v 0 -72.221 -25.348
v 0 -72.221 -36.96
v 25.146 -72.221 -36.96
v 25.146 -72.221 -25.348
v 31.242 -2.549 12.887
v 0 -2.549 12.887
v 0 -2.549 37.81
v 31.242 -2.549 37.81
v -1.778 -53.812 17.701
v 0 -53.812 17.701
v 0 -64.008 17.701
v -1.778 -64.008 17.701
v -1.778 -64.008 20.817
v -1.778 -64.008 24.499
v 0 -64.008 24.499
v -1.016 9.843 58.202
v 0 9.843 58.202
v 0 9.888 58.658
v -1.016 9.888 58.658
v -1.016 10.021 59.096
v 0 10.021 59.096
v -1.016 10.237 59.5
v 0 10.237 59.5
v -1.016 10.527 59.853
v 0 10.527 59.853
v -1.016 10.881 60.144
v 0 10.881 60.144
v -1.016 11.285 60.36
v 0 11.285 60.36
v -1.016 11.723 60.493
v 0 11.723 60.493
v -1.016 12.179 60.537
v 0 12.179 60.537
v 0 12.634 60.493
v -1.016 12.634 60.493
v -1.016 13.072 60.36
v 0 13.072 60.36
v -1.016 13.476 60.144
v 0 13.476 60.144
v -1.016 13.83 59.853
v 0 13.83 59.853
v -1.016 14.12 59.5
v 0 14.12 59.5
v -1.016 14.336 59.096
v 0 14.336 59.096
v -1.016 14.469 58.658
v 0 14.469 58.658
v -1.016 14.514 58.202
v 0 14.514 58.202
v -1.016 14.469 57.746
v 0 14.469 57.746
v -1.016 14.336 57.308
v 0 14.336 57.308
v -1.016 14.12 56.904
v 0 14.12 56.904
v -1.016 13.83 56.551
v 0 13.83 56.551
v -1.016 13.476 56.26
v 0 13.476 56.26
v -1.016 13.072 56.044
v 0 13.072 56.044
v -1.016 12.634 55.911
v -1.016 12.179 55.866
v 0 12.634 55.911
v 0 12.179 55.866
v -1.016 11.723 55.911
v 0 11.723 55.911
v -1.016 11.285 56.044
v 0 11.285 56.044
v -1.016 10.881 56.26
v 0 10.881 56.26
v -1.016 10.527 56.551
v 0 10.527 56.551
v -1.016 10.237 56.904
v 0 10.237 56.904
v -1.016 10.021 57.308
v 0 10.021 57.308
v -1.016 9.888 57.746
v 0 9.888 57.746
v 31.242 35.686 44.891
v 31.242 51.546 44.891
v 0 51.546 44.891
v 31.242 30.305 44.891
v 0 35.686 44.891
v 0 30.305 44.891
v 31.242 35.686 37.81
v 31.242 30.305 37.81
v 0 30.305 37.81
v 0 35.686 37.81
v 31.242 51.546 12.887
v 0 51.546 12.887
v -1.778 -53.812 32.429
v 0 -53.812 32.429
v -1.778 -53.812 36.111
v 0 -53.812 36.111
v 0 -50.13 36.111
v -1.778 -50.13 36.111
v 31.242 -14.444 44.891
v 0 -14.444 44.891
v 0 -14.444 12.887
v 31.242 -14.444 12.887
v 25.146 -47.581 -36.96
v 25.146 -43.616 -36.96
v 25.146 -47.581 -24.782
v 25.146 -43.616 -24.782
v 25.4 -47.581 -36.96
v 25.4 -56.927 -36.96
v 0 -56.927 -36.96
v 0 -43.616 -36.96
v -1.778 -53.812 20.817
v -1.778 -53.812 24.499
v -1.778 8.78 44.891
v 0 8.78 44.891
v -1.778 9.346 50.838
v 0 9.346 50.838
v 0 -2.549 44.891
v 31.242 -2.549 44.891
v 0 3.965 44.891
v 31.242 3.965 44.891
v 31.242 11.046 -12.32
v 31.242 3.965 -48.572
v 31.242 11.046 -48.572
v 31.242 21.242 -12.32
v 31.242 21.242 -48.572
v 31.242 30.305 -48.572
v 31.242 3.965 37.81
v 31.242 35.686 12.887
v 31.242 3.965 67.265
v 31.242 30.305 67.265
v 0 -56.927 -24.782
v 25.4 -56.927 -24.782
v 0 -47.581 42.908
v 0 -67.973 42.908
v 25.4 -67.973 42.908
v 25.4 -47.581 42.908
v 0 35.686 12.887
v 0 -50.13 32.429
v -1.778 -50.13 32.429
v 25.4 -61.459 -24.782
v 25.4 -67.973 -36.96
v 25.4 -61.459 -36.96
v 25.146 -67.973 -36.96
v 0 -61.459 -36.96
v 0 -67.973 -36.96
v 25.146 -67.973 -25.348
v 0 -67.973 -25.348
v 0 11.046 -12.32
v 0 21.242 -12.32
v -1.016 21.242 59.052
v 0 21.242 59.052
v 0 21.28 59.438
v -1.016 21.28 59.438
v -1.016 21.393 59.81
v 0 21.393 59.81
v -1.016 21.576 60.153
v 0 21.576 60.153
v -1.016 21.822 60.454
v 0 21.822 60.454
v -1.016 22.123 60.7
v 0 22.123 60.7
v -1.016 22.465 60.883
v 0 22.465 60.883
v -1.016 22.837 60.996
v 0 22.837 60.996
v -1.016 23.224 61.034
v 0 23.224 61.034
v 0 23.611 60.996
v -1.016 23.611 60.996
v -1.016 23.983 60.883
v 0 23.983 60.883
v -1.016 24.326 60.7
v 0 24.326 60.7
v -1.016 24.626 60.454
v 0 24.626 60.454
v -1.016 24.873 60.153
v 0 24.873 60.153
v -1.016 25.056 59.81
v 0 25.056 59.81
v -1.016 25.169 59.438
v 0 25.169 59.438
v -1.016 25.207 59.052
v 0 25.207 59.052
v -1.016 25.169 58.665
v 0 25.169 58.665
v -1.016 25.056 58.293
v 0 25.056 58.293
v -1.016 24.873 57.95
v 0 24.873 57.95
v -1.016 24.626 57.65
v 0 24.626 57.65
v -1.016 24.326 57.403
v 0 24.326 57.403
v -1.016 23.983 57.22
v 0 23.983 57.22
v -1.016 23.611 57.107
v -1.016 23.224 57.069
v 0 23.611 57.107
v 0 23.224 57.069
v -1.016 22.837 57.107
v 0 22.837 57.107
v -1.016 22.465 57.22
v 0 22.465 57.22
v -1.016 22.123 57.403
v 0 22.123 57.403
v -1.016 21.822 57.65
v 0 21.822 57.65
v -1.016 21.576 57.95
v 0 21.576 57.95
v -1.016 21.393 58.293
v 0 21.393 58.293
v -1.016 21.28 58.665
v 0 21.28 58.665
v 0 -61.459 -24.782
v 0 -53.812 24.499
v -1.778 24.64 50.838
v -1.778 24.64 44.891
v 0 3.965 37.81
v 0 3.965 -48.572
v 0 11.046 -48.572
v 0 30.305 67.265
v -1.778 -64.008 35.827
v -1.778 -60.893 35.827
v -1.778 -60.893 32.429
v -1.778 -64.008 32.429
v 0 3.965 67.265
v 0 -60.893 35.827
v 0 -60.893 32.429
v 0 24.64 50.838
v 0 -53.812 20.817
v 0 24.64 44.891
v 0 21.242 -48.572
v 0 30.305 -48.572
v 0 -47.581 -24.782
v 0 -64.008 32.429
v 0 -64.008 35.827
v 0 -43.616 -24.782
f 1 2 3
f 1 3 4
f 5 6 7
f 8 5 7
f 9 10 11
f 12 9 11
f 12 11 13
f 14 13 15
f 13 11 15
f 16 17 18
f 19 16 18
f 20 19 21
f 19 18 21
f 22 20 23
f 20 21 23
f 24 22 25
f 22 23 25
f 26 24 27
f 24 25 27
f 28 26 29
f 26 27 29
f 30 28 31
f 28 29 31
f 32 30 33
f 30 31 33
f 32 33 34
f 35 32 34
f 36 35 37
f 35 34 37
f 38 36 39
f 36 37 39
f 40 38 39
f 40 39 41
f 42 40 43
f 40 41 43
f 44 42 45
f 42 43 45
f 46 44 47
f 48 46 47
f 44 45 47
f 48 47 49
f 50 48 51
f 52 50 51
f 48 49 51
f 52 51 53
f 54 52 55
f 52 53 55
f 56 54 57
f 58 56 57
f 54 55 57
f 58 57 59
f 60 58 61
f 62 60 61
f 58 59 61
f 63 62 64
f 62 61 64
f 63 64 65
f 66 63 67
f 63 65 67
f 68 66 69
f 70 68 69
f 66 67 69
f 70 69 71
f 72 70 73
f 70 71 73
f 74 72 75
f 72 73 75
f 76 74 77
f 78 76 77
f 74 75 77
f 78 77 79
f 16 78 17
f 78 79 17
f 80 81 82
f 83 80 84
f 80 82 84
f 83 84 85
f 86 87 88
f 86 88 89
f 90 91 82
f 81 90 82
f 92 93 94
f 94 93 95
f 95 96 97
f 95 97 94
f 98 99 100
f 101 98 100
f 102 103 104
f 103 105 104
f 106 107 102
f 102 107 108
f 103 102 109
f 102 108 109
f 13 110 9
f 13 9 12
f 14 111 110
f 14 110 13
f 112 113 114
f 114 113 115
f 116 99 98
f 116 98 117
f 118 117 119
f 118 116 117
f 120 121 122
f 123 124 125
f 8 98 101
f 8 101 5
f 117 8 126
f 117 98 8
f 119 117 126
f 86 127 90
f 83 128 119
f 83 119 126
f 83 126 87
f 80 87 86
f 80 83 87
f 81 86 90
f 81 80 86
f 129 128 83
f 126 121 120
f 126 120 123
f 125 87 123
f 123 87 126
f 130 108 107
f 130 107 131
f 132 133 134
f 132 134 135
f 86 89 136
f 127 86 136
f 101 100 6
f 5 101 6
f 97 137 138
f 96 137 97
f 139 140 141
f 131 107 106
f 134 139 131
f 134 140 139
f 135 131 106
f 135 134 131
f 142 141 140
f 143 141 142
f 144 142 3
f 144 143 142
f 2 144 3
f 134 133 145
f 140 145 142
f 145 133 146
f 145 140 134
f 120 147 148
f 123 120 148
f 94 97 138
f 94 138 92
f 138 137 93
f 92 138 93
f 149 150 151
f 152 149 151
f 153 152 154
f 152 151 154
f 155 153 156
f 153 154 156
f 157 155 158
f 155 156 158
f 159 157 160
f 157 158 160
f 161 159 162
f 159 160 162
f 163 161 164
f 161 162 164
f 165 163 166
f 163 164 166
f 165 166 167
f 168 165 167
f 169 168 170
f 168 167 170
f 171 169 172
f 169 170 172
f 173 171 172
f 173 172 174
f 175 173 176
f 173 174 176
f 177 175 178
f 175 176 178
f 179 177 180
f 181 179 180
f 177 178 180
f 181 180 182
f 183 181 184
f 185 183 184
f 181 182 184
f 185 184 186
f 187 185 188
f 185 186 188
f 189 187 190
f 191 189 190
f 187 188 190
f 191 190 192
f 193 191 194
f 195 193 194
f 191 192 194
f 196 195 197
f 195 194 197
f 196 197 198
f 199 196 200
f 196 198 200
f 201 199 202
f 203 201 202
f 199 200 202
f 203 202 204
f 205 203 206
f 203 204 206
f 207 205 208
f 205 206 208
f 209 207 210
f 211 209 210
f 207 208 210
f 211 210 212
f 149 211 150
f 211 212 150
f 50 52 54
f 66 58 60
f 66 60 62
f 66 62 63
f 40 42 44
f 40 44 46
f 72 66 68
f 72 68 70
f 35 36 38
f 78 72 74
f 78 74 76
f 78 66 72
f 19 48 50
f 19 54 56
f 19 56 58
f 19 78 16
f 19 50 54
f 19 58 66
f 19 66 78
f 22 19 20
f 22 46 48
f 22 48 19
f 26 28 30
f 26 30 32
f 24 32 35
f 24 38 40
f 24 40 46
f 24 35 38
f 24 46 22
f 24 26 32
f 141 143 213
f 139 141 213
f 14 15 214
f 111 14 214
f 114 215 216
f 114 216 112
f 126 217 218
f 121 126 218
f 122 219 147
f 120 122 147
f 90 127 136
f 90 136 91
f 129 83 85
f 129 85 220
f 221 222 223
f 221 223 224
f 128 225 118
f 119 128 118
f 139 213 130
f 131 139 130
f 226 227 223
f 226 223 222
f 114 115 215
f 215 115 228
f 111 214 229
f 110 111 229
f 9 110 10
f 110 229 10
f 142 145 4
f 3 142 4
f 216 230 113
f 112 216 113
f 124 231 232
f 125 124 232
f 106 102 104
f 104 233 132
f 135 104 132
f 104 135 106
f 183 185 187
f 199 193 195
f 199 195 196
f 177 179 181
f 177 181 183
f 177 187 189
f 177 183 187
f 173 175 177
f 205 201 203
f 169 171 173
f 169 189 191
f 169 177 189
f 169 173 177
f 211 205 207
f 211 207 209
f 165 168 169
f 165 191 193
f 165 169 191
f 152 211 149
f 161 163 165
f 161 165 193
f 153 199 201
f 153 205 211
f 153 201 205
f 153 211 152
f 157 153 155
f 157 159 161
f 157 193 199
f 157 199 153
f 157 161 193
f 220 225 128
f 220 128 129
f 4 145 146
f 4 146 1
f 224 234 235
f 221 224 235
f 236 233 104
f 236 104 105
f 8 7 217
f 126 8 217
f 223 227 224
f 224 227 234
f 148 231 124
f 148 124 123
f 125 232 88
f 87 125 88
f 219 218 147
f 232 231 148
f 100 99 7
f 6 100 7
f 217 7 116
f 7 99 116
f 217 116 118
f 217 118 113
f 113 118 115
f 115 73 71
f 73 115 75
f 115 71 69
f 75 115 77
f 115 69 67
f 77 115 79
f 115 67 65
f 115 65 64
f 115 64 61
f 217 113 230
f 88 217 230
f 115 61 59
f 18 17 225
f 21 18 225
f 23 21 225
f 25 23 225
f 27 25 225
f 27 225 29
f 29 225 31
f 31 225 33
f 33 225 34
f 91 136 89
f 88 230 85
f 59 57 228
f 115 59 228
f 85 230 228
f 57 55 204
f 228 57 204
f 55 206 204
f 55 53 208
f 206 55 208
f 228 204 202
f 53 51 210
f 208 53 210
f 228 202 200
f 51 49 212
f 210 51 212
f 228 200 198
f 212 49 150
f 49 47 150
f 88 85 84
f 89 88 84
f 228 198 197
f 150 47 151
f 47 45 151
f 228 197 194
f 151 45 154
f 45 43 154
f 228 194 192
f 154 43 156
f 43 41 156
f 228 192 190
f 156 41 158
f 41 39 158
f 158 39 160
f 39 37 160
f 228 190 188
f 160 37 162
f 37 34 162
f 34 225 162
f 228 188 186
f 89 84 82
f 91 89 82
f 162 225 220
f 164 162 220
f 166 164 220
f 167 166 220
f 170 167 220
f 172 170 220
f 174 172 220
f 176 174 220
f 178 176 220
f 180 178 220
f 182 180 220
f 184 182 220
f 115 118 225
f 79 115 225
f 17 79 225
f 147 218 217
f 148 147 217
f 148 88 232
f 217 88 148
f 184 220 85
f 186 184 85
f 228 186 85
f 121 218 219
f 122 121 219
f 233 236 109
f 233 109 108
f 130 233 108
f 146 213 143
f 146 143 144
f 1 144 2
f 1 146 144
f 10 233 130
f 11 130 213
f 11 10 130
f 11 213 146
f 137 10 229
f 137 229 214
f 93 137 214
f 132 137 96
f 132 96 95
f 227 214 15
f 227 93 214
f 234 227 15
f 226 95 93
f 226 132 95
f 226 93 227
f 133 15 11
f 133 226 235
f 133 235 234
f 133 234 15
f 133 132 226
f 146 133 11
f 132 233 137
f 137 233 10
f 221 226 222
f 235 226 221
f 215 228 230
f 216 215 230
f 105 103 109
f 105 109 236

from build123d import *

# Parameters (mm, degrees)
F0_W      = 26.339576114
F0_H      = 22.3744772375
F0_W_2    = 5.3812060505
F0_H_2    = 7.0805288851
F0_W_3    = 6.5140875522
F0_W_4    = 9.0630780905
F0_H_3    = 36.2523160875
F0_W_5    = 7.0805349387
F1_DEPTH  = 31.242
F3_DEPTH  = 1.778
F2_R      = 1.9825492054
F2_R_2    = 2.3355022463
F4_DEPTH  = 1.016
F5_W      = 20.3919298947
F5_H      = 20.9583751857
F5_W_2    = 6.5140910447
F5_H_2    = 9.9127404392
F5_W_3    = 9.3463025987
F5_H_3    = 12.1785104275
F5_H_4    = 2.2657699883
F6_DEPTH  = 25.4
F7_W      = 4.2483210564
F7_H      = 11.6120707244
F7_W_2    = 9.3463025987
F7_H_2    = 12.1785104275
F7_W_3    = 3.9651021361
F8_DEPTH  = 25.146
F9_W      = 3.6818757653
F9_H      = 3.6818794906
F9_W_2    = 3.1154304743
F9_H_2    = 3.3986568451
F9_H_3    = 3.1154323369
F9_W_3    = 5.0979815423
F9_W_4    = 1.9825510681
F10_DEPTH = 1.778


with BuildPart() as f1:
    # F0 (on Right) → F1 (new body)
    with BuildSketch(Plane.YZ):
        with Locations((17.1348841395, 56.0778025538)):
            Rectangle(F0_W, F0_H)
        Polygon((30.3046721965, 37.8100350499), (30.3046721965, 44.890563935), (3.9650960825, 44.890563935), (3.9650960825, 37.8100350499), (3.9650960825, -12.3201236129), (11.0456310213, -12.3201236129), (21.241594106, -12.3201236129), (30.3046721965, -12.3201236129), align=None)
        with Locations((32.9952752218, 41.3502994925)):
            Rectangle(F0_W_2, F0_H_2)
        with Locations((0.7080523064, 41.3502994925)):
            Rectangle(F0_W_3, F0_H_2)
        Polygon((51.5462644398, 44.890563935), (35.685878247, 44.890563935), (35.685878247, 37.8100350499), (35.685878247, 12.88656611), (51.5462644398, 12.88656611), align=None)
        Polygon((-2.5489914697, 37.8100350499), (-2.5489914697, 44.890563935), (-14.4442832097, 44.890563935), (-14.4442832097, 12.88656611), (-2.5489914697, 12.88656611), align=None)
        with Locations((25.7731331512, -30.4462816566)):
            Rectangle(F0_W_4, F0_H_3)
        with Locations((7.5053635519, -30.4462816566)):
            Rectangle(F0_W_5, F0_H_3)
    extrude(amount=F1_DEPTH)

    # F2 (on face) → F3 (join)
    with BuildSketch(Plane(origin=(0, 0, 0), x_dir=(0, -1, 0), z_dir=(-1, 0, 0))):
        Polygon((-8.779858239, 44.890563935), (-9.3462998047, 50.8382096887), (-24.6402472258, 50.8382096887), (-24.6402472258, 44.890563935), align=None)
    extrude(amount=F3_DEPTH)

    # F2 (on face) → F4 (join)
    with BuildSketch(Plane(origin=(0, 0, 0), x_dir=(0, -1, 0), z_dir=(-1, 0, 0))):
        with Locations((-23.2241433114, 59.0516291559)):
            Circle(F2_R)
        with Locations((-12.1785150841, 58.2019649446)):
            Circle(F2_R_2)
        Polygon((-8.779858239, 44.890563935), (-9.3462998047, 50.8382096887), (-24.6402472258, 50.8382096887), (-24.6402472258, 44.890563935), align=None)
    extrude(amount=F4_DEPTH)


with BuildPart() as f6:
    # F5 (on Right) → F6 (new body)
    with BuildSketch(Plane.YZ):
        with Locations((-57.7771347016, 32.4288327247)):
            Rectangle(F5_W, F5_H)
        Polygon((-47.5811697543, 21.9496451318), (-67.973099649, 21.9496451318), (-67.973099649, -24.7818604112), (-61.4590086043, -24.7818604112), (-56.927472353, -24.7818604112), (-47.5811697543, -24.7818604112), align=None)
        with Locations((-64.7160541266, -29.7382306308)):
            Rectangle(F5_W_2, F5_H_2)
        with Locations((-52.2543210536, -30.8711156249)):
            Rectangle(F5_W_3, F5_H_3)
        with Locations((-64.7160541266, -35.8274858445)):
            Rectangle(F5_W_2, F5_H_4)
    extrude(amount=F6_DEPTH)

    # F7 (on face) → F8 (join)
    with BuildSketch(Plane(origin=(0, 0, 0), x_dir=(0, -1, 0), z_dir=(-1, 0, 0))):
        with Locations((70.0972601771, -31.1543354765)):
            Rectangle(F7_W, F7_H)
        with Locations((52.2543210536, -30.8711156249)):
            Rectangle(F7_W_2, F7_H_2)
        with Locations((45.5986186862, -30.8711156249)):
            Rectangle(F7_W_3, F7_H_2)
    extrude(amount=-F8_DEPTH)

    # F9 (on face) → F10 (join)
    with BuildSketch(Plane(origin=(0, 0, 0), x_dir=(0, -1, 0), z_dir=(-1, 0, 0))):
        with Locations((51.9710965455, 34.2697706074)):
            Rectangle(F9_W, F9_H)
        with Locations((62.4502822757, 34.1281592846)):
            Rectangle(F9_W_2, F9_H_2)
        Polygon((64.0079975128, 20.8167601377), (64.0079975128, 24.4986377656), (53.8120344281, 24.4986377656), (53.8120344281, 20.8167601377), (58.9100159705, 20.8167601377), (60.8925670385, 20.8167601377), align=None)
        with Locations((62.4502822757, 19.2590439692)):
            Rectangle(F9_W_2, F9_H_3)
        with Locations((56.3610251993, 19.2590439692)):
            Rectangle(F9_W_3, F9_H_3)
        with Locations((59.9012915045, 19.2590439692)):
            Rectangle(F9_W_4, F9_H_3)
    extrude(amount=F10_DEPTH)


solid = Compound([f1.part, f6.part])
